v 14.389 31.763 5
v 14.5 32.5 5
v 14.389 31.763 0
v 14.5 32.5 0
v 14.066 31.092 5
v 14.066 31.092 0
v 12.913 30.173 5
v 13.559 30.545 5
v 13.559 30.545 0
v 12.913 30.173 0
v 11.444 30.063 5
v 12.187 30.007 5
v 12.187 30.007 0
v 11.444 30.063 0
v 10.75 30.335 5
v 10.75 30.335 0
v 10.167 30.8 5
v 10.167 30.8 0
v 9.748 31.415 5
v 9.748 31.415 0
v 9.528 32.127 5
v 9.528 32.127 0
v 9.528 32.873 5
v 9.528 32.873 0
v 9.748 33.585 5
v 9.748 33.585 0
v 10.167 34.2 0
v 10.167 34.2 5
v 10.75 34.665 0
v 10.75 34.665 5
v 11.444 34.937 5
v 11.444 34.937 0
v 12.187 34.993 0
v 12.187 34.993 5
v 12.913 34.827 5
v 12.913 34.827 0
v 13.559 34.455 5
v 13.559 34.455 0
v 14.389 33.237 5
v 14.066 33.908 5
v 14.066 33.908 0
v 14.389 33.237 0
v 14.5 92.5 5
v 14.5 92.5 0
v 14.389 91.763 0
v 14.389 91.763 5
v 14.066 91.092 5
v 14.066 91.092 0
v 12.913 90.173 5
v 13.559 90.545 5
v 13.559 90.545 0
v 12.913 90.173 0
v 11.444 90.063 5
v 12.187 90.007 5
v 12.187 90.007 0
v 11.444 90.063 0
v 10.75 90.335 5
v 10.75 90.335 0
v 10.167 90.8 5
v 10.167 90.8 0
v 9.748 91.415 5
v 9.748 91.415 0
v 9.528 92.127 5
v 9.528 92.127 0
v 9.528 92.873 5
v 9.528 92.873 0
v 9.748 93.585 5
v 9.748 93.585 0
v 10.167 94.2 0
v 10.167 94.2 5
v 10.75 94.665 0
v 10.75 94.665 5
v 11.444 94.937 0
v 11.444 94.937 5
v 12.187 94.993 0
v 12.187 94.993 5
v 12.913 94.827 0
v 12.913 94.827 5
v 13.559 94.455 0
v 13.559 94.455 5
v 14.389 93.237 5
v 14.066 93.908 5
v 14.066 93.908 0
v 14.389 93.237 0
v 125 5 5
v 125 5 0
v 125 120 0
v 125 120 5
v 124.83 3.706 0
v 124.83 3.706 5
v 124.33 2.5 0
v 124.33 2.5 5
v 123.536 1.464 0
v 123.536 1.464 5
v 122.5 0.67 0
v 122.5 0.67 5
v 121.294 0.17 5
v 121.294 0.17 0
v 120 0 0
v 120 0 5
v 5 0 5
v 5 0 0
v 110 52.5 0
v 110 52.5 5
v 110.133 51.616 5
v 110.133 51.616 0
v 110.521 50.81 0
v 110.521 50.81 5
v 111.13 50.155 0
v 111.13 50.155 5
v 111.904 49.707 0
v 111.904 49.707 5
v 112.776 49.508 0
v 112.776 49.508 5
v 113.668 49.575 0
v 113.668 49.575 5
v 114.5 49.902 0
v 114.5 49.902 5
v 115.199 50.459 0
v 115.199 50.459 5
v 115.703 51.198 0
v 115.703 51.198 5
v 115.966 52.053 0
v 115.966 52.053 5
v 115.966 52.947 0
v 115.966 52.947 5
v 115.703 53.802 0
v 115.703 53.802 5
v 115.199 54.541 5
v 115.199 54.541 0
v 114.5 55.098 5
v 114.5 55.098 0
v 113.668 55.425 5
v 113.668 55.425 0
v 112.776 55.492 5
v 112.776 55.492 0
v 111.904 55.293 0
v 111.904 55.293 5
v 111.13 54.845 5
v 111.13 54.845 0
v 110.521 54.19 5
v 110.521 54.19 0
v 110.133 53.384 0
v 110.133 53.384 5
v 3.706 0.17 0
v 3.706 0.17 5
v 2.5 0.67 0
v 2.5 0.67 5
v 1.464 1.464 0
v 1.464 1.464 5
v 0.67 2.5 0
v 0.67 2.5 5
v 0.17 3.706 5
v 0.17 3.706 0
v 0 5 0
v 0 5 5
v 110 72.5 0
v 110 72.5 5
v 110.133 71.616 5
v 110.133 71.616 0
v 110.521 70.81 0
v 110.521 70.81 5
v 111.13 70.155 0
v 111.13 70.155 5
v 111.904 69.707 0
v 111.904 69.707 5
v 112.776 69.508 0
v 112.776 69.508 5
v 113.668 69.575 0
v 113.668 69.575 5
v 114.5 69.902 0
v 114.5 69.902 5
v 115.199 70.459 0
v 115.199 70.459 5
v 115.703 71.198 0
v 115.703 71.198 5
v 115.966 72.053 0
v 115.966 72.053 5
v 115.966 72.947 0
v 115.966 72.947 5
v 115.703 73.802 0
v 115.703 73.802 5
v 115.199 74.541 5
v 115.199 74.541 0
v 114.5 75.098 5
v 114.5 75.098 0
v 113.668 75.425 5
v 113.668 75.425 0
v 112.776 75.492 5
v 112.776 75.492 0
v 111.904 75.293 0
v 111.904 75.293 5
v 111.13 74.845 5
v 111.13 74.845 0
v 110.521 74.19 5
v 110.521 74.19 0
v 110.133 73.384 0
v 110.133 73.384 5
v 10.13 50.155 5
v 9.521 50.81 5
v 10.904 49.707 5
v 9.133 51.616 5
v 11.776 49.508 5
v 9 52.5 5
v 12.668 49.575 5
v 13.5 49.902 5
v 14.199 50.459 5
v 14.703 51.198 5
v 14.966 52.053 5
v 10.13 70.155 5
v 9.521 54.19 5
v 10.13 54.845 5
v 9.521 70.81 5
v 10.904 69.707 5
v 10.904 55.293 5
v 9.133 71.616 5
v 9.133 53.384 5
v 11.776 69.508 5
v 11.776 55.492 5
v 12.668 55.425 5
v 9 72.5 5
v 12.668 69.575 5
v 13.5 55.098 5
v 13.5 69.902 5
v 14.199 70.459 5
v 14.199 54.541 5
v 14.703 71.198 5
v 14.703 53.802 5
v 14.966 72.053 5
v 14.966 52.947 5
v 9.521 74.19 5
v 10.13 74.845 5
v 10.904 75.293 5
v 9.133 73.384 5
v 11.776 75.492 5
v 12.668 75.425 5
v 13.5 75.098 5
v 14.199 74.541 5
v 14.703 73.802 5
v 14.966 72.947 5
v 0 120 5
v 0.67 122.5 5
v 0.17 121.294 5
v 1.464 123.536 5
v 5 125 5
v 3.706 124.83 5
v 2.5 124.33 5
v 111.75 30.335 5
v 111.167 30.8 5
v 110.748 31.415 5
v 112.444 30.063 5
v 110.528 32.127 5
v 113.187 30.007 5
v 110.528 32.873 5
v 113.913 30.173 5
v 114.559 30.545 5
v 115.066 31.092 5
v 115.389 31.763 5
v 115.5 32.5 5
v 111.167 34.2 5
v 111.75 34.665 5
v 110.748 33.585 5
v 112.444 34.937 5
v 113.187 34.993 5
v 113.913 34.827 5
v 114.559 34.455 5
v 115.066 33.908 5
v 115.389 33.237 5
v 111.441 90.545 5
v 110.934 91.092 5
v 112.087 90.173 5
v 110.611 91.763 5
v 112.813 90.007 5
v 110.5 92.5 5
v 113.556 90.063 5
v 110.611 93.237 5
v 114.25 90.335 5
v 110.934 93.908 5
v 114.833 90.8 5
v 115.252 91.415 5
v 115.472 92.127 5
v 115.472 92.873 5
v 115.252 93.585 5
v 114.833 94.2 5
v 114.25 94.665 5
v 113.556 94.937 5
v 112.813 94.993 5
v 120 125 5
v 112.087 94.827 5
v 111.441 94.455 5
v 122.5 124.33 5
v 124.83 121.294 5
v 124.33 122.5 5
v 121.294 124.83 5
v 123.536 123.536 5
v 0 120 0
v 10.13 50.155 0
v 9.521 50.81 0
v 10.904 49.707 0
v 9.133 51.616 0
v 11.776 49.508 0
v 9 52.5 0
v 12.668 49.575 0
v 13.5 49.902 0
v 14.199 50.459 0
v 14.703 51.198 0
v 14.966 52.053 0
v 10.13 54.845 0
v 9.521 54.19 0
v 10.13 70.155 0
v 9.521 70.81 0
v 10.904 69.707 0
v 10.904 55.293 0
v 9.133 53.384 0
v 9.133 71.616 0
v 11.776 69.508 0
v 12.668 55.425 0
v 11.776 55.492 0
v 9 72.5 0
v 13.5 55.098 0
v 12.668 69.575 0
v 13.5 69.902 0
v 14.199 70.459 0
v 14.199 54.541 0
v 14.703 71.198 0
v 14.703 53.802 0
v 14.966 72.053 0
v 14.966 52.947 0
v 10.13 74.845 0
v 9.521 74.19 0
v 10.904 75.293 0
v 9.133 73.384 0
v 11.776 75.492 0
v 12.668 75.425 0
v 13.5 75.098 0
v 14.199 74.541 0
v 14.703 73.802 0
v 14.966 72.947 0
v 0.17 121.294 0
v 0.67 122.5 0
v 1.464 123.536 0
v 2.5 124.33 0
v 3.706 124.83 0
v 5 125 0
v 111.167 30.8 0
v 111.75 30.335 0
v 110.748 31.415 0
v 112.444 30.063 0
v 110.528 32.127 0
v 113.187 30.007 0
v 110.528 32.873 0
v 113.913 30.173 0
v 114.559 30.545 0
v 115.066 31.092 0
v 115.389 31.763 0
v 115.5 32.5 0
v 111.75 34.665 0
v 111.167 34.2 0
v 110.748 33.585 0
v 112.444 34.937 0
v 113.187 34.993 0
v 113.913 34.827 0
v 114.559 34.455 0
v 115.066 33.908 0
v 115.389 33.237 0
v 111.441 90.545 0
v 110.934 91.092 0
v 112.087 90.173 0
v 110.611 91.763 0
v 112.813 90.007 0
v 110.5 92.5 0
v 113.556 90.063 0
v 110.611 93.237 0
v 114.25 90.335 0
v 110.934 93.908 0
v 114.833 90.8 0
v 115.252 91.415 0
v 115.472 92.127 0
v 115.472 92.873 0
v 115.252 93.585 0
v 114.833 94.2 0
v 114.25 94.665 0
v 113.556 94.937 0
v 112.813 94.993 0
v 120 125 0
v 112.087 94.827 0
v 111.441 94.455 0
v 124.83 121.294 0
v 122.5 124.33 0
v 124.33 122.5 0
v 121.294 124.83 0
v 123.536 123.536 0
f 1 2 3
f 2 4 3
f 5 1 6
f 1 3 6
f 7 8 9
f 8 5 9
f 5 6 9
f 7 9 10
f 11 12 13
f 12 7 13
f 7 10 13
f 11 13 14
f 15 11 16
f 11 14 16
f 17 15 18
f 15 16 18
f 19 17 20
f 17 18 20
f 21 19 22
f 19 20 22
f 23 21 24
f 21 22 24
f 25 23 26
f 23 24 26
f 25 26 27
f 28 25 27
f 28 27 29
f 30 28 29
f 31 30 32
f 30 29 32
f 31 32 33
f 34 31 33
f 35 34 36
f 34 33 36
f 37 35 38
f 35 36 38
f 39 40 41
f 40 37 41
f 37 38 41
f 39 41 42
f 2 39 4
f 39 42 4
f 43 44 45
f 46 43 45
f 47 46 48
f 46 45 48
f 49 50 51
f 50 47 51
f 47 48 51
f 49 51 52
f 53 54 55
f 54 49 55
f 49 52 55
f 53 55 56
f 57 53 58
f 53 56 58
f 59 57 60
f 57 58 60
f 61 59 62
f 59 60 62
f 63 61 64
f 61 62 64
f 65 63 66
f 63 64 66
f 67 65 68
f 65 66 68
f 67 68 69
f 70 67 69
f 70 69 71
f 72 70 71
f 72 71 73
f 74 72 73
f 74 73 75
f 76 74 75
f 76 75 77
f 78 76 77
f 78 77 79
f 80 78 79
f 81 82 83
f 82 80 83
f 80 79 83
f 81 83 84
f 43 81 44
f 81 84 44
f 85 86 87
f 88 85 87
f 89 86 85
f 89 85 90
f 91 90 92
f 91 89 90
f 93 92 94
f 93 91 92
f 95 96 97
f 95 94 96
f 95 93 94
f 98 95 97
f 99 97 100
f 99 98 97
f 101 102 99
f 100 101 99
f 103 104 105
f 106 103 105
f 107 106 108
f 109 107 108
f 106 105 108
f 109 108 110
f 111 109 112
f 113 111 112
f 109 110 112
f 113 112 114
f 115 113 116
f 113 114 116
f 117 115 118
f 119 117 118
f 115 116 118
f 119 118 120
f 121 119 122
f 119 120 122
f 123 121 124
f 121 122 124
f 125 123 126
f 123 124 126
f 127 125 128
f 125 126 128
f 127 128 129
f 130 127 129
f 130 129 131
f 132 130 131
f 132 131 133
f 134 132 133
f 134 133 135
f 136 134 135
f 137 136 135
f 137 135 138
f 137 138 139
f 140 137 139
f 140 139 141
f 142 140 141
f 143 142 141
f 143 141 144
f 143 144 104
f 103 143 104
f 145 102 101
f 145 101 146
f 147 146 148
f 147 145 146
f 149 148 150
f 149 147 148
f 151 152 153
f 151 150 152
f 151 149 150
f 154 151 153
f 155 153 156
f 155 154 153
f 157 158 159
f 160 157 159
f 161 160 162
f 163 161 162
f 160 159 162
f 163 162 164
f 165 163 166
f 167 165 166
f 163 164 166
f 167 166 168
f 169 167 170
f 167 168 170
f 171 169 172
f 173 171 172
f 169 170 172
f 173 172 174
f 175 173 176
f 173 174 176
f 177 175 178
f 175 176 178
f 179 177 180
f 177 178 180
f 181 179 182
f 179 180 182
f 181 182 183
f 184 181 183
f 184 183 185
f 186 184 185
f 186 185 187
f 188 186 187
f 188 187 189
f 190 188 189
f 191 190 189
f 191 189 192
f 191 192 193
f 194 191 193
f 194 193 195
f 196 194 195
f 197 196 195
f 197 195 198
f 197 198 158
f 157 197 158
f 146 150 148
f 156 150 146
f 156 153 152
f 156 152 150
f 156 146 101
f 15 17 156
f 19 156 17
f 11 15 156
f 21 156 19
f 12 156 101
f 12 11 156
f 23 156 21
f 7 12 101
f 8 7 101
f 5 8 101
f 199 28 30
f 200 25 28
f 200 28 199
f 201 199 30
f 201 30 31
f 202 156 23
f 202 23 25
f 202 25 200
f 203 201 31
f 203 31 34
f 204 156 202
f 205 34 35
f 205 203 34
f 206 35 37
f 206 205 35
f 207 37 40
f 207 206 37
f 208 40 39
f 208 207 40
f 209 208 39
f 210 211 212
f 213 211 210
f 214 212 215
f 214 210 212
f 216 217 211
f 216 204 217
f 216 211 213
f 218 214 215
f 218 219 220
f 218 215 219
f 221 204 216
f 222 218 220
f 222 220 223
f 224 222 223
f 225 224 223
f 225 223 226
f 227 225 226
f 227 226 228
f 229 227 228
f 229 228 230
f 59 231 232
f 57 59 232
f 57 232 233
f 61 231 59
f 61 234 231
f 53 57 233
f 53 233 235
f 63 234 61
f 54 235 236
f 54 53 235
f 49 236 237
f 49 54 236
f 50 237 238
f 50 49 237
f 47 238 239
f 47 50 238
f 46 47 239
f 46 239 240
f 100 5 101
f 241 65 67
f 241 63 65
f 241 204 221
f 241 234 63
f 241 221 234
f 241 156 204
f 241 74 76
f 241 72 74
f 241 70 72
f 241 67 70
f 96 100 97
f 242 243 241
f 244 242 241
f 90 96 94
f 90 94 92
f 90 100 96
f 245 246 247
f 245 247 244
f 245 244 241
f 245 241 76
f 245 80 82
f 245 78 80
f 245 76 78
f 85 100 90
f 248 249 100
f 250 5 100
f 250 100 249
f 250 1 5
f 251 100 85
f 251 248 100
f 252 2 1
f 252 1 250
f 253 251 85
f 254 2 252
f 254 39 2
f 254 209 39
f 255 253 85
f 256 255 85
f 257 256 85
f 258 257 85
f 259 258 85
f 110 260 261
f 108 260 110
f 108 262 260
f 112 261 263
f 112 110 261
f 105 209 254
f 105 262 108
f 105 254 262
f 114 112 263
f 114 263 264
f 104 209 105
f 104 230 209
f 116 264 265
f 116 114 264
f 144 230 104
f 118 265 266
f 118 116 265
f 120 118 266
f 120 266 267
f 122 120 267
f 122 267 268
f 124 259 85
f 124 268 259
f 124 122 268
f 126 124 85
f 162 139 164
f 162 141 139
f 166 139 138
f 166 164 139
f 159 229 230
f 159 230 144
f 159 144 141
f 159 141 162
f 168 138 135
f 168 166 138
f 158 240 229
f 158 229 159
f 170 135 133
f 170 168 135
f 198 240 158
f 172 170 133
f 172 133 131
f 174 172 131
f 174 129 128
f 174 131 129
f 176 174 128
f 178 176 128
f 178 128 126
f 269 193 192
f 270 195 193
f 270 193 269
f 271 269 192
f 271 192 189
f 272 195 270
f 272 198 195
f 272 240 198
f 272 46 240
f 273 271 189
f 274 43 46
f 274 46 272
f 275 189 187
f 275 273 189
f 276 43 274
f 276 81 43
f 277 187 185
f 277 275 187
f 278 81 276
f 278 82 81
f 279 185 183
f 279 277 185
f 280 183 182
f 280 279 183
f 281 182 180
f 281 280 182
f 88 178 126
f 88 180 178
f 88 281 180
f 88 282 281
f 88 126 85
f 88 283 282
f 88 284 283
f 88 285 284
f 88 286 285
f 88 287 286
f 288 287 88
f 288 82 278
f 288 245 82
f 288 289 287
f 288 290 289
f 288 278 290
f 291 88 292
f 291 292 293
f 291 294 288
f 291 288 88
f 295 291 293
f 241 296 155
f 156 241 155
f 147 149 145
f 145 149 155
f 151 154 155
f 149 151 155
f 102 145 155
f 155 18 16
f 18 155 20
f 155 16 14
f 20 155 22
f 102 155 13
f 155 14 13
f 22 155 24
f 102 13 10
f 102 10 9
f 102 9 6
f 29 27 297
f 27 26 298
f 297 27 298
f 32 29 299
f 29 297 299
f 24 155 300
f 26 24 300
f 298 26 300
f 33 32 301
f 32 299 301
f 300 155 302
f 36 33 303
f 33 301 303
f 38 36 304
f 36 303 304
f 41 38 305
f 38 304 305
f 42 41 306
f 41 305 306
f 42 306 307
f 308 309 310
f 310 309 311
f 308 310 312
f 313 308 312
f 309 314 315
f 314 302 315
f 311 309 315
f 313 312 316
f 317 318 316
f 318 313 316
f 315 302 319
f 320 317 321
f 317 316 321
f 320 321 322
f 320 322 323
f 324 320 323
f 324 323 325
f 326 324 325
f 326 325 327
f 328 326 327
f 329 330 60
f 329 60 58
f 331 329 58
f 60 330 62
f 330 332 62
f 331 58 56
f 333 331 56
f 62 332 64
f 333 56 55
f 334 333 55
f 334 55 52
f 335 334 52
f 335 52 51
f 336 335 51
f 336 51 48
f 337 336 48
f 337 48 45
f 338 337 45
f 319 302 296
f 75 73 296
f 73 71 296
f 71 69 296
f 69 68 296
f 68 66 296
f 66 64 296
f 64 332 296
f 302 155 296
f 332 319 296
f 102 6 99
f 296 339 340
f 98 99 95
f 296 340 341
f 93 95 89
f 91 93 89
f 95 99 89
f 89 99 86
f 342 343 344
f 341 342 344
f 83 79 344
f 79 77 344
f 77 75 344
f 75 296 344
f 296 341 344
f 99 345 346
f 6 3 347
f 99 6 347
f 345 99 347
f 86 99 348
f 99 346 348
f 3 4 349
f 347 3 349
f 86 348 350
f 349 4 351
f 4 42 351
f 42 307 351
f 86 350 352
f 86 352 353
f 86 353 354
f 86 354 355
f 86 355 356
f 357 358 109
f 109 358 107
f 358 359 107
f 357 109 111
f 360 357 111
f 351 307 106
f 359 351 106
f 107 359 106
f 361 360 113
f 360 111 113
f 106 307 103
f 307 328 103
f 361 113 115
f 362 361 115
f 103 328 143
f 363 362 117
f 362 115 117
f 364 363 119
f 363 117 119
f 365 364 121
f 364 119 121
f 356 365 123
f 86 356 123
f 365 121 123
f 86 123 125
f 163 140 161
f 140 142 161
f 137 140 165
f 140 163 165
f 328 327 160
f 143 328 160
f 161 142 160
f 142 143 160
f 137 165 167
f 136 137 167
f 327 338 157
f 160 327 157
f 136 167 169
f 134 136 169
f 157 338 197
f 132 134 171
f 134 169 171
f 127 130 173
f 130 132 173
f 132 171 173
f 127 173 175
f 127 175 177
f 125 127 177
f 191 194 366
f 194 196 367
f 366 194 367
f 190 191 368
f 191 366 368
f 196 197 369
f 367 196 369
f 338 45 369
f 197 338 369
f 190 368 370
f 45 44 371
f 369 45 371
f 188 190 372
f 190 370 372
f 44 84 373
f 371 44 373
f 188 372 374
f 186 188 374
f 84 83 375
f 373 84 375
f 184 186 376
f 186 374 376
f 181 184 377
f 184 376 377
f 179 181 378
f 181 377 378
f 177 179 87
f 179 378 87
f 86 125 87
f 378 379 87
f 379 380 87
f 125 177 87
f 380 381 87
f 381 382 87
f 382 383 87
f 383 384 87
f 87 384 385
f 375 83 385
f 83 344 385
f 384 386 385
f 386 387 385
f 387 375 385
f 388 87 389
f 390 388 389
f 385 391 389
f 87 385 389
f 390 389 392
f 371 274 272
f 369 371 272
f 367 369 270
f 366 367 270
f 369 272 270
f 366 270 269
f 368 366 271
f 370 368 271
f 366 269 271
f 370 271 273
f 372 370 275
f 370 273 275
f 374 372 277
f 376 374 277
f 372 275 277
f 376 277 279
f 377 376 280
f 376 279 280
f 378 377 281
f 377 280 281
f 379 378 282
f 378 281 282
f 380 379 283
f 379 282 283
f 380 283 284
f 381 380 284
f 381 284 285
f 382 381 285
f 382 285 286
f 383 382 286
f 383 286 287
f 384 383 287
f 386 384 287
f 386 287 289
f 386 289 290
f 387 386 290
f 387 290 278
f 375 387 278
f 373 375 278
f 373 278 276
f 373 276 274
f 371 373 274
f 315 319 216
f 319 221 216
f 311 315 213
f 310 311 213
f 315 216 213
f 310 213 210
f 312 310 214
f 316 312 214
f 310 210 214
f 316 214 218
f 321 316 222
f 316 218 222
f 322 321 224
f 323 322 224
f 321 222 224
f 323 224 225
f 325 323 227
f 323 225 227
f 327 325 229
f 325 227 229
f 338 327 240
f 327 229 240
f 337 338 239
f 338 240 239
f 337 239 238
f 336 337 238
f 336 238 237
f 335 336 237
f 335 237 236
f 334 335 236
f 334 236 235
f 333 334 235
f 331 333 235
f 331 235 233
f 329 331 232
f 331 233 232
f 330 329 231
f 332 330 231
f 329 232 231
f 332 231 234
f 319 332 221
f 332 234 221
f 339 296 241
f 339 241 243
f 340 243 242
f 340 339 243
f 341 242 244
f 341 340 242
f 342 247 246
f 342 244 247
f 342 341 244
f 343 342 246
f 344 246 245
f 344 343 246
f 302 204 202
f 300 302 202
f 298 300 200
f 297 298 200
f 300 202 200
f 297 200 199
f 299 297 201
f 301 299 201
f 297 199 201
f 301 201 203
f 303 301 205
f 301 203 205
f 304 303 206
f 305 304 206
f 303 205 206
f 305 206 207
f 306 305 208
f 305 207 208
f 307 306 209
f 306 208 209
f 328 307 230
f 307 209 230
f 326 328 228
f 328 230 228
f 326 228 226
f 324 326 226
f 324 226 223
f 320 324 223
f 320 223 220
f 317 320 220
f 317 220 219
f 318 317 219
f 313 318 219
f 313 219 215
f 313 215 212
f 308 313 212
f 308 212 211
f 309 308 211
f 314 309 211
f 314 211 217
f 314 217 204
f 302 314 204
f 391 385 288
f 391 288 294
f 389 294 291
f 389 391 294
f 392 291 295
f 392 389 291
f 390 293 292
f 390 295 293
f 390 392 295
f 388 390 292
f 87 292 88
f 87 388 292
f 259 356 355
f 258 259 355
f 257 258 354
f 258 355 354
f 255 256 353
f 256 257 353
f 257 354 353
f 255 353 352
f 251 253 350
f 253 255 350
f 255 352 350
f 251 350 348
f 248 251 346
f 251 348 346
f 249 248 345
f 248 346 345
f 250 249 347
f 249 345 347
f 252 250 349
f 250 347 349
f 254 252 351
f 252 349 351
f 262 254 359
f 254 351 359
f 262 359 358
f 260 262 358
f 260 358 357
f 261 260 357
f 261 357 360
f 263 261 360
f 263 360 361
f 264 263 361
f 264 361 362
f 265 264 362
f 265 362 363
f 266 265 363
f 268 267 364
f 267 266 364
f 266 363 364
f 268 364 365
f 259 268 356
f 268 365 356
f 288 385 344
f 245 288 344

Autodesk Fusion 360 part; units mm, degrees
sketch "Sketch1" plane through (0, 0, 0) normal (0, 0, 1) x (1, 0, 0)
  line L0 (5, 0) -> (120, 0)
  line L1 (125, 5) -> (125, 120)
  line L2 (120, 125) -> (5, 125)
  line L3 (0, 120) -> (0, 5)
  arc A0 (125, 120) -> (120, 125) centre (120, 120) ccw
  arc A1 (5, 125) -> (0, 120) centre (5, 120) ccw
  arc A2 (0, 5) -> (5, 0) centre (5, 5) ccw
  arc A3 (120, 0) -> (125, 5) centre (120, 5) ccw
  circle A4 centre (12, 32.5) radius 2.5
  circle A5 centre (113, 32.5) radius 2.5
  circle A6 centre (12, 92.5) radius 2.5
  line L4 (45, 80) -> (80, 80)
  line L5 (80, 80) -> (80, 45)
  line L6 (80, 45) -> (45, 45)
  line L7 (45, 45) -> (45, 80)
  dimension "d3" = 10
  dimension "d4" = 10
  dimension "d5" = 10
  dimension "d6" = 10
  dimension "d7" = 5
  dimension "d8" = 12
  dimension "d9" = 32.5
  dimension "d10" = 5
  dimension "d11" = 12
  dimension "d12" = 32.5
  dimension "d13" = 5
  dimension "d15" = 12
  dimension "d16" = 32.5
  dimension "d81" = 35
  dimension "d82" = 35
  dimension "d83" = 45
  dimension "d84" = 45
  dimension "d85" = 45
  dimension "d86" = 45
extrude "Extrude1" add sketch "Sketch1" along normal blind 5 contours L0 L1 L2 L3 A0 A1 A2 A3 | L4 L5 L6 L7
sketch "Sketch2" plane through (0, 0, 5) normal (0, 0, 1) x (-1, 0, 0)
  circle A0 centre (-12, -72.5) radius 3
  line L0 (0, -120) -> (0, -5)
  circle A1 centre (-12, -52.5) radius 3
  circle A2 centre (-113, -52.5) radius 3
  line L1 (-125, -5) -> (-125, -120)
  circle A3 centre (-113, -72.5) radius 3
  circle A4 centre (-113, -92.5) radius 2.5
  line L2 (-120, -125) -> (-5, -125)
  point P0 (-12, -92.5)
  point P1 (-12, -32.5)
  point P2 (-113, -32.5)
  dimension "d65" = 6
  dimension "d66" = 20
  dimension "d67" = 12
  dimension "d68" = 6
  dimension "d69" = 20
  dimension "d70" = 12
  dimension "d71" = 20
  dimension "d72" = 6
  dimension "d73" = 12
  dimension "d74" = 6
  dimension "d75" = 12
  dimension "d148" = 5
  dimension "d149" = 20
  dimension "d150" = 20
  dimension "d151" = 20
  dimension "d152" = 32.5
  dimension "d153" = 12
sketch "Sketch3" plane through (0, 0, 5) normal (0, 0, 1) x (-1, 0, 0)
extrude "Extrude2" add sketch "Sketch2" against normal blind 5 contours A0 | A1 | A2 | A3
extrude "Extrude3" cut sketch "Sketch2" against normal blind 5 contours A0 | A1 | A2 | A3
sketch "Sketch4" plane through (0, 0, 5) normal (0, 0, 1) x (-1, 0, 0)
  circle A0 centre (-113, -92.5) radius 2.5
  line L0 (-120, -125) -> (-5, -125)
  line L1 (-125, -5) -> (-125, -120)
  dimension "d145" = 5
  dimension "d146" = 32.5
  dimension "d147" = 12
extrude "Extrude4" cut sketch "Sketch4" against normal blind 5
equation "main_plate_thickness = 5 mm"
equation "d77 = -main_plate_thickness"
equation "d79 = -main_plate_thickness"
